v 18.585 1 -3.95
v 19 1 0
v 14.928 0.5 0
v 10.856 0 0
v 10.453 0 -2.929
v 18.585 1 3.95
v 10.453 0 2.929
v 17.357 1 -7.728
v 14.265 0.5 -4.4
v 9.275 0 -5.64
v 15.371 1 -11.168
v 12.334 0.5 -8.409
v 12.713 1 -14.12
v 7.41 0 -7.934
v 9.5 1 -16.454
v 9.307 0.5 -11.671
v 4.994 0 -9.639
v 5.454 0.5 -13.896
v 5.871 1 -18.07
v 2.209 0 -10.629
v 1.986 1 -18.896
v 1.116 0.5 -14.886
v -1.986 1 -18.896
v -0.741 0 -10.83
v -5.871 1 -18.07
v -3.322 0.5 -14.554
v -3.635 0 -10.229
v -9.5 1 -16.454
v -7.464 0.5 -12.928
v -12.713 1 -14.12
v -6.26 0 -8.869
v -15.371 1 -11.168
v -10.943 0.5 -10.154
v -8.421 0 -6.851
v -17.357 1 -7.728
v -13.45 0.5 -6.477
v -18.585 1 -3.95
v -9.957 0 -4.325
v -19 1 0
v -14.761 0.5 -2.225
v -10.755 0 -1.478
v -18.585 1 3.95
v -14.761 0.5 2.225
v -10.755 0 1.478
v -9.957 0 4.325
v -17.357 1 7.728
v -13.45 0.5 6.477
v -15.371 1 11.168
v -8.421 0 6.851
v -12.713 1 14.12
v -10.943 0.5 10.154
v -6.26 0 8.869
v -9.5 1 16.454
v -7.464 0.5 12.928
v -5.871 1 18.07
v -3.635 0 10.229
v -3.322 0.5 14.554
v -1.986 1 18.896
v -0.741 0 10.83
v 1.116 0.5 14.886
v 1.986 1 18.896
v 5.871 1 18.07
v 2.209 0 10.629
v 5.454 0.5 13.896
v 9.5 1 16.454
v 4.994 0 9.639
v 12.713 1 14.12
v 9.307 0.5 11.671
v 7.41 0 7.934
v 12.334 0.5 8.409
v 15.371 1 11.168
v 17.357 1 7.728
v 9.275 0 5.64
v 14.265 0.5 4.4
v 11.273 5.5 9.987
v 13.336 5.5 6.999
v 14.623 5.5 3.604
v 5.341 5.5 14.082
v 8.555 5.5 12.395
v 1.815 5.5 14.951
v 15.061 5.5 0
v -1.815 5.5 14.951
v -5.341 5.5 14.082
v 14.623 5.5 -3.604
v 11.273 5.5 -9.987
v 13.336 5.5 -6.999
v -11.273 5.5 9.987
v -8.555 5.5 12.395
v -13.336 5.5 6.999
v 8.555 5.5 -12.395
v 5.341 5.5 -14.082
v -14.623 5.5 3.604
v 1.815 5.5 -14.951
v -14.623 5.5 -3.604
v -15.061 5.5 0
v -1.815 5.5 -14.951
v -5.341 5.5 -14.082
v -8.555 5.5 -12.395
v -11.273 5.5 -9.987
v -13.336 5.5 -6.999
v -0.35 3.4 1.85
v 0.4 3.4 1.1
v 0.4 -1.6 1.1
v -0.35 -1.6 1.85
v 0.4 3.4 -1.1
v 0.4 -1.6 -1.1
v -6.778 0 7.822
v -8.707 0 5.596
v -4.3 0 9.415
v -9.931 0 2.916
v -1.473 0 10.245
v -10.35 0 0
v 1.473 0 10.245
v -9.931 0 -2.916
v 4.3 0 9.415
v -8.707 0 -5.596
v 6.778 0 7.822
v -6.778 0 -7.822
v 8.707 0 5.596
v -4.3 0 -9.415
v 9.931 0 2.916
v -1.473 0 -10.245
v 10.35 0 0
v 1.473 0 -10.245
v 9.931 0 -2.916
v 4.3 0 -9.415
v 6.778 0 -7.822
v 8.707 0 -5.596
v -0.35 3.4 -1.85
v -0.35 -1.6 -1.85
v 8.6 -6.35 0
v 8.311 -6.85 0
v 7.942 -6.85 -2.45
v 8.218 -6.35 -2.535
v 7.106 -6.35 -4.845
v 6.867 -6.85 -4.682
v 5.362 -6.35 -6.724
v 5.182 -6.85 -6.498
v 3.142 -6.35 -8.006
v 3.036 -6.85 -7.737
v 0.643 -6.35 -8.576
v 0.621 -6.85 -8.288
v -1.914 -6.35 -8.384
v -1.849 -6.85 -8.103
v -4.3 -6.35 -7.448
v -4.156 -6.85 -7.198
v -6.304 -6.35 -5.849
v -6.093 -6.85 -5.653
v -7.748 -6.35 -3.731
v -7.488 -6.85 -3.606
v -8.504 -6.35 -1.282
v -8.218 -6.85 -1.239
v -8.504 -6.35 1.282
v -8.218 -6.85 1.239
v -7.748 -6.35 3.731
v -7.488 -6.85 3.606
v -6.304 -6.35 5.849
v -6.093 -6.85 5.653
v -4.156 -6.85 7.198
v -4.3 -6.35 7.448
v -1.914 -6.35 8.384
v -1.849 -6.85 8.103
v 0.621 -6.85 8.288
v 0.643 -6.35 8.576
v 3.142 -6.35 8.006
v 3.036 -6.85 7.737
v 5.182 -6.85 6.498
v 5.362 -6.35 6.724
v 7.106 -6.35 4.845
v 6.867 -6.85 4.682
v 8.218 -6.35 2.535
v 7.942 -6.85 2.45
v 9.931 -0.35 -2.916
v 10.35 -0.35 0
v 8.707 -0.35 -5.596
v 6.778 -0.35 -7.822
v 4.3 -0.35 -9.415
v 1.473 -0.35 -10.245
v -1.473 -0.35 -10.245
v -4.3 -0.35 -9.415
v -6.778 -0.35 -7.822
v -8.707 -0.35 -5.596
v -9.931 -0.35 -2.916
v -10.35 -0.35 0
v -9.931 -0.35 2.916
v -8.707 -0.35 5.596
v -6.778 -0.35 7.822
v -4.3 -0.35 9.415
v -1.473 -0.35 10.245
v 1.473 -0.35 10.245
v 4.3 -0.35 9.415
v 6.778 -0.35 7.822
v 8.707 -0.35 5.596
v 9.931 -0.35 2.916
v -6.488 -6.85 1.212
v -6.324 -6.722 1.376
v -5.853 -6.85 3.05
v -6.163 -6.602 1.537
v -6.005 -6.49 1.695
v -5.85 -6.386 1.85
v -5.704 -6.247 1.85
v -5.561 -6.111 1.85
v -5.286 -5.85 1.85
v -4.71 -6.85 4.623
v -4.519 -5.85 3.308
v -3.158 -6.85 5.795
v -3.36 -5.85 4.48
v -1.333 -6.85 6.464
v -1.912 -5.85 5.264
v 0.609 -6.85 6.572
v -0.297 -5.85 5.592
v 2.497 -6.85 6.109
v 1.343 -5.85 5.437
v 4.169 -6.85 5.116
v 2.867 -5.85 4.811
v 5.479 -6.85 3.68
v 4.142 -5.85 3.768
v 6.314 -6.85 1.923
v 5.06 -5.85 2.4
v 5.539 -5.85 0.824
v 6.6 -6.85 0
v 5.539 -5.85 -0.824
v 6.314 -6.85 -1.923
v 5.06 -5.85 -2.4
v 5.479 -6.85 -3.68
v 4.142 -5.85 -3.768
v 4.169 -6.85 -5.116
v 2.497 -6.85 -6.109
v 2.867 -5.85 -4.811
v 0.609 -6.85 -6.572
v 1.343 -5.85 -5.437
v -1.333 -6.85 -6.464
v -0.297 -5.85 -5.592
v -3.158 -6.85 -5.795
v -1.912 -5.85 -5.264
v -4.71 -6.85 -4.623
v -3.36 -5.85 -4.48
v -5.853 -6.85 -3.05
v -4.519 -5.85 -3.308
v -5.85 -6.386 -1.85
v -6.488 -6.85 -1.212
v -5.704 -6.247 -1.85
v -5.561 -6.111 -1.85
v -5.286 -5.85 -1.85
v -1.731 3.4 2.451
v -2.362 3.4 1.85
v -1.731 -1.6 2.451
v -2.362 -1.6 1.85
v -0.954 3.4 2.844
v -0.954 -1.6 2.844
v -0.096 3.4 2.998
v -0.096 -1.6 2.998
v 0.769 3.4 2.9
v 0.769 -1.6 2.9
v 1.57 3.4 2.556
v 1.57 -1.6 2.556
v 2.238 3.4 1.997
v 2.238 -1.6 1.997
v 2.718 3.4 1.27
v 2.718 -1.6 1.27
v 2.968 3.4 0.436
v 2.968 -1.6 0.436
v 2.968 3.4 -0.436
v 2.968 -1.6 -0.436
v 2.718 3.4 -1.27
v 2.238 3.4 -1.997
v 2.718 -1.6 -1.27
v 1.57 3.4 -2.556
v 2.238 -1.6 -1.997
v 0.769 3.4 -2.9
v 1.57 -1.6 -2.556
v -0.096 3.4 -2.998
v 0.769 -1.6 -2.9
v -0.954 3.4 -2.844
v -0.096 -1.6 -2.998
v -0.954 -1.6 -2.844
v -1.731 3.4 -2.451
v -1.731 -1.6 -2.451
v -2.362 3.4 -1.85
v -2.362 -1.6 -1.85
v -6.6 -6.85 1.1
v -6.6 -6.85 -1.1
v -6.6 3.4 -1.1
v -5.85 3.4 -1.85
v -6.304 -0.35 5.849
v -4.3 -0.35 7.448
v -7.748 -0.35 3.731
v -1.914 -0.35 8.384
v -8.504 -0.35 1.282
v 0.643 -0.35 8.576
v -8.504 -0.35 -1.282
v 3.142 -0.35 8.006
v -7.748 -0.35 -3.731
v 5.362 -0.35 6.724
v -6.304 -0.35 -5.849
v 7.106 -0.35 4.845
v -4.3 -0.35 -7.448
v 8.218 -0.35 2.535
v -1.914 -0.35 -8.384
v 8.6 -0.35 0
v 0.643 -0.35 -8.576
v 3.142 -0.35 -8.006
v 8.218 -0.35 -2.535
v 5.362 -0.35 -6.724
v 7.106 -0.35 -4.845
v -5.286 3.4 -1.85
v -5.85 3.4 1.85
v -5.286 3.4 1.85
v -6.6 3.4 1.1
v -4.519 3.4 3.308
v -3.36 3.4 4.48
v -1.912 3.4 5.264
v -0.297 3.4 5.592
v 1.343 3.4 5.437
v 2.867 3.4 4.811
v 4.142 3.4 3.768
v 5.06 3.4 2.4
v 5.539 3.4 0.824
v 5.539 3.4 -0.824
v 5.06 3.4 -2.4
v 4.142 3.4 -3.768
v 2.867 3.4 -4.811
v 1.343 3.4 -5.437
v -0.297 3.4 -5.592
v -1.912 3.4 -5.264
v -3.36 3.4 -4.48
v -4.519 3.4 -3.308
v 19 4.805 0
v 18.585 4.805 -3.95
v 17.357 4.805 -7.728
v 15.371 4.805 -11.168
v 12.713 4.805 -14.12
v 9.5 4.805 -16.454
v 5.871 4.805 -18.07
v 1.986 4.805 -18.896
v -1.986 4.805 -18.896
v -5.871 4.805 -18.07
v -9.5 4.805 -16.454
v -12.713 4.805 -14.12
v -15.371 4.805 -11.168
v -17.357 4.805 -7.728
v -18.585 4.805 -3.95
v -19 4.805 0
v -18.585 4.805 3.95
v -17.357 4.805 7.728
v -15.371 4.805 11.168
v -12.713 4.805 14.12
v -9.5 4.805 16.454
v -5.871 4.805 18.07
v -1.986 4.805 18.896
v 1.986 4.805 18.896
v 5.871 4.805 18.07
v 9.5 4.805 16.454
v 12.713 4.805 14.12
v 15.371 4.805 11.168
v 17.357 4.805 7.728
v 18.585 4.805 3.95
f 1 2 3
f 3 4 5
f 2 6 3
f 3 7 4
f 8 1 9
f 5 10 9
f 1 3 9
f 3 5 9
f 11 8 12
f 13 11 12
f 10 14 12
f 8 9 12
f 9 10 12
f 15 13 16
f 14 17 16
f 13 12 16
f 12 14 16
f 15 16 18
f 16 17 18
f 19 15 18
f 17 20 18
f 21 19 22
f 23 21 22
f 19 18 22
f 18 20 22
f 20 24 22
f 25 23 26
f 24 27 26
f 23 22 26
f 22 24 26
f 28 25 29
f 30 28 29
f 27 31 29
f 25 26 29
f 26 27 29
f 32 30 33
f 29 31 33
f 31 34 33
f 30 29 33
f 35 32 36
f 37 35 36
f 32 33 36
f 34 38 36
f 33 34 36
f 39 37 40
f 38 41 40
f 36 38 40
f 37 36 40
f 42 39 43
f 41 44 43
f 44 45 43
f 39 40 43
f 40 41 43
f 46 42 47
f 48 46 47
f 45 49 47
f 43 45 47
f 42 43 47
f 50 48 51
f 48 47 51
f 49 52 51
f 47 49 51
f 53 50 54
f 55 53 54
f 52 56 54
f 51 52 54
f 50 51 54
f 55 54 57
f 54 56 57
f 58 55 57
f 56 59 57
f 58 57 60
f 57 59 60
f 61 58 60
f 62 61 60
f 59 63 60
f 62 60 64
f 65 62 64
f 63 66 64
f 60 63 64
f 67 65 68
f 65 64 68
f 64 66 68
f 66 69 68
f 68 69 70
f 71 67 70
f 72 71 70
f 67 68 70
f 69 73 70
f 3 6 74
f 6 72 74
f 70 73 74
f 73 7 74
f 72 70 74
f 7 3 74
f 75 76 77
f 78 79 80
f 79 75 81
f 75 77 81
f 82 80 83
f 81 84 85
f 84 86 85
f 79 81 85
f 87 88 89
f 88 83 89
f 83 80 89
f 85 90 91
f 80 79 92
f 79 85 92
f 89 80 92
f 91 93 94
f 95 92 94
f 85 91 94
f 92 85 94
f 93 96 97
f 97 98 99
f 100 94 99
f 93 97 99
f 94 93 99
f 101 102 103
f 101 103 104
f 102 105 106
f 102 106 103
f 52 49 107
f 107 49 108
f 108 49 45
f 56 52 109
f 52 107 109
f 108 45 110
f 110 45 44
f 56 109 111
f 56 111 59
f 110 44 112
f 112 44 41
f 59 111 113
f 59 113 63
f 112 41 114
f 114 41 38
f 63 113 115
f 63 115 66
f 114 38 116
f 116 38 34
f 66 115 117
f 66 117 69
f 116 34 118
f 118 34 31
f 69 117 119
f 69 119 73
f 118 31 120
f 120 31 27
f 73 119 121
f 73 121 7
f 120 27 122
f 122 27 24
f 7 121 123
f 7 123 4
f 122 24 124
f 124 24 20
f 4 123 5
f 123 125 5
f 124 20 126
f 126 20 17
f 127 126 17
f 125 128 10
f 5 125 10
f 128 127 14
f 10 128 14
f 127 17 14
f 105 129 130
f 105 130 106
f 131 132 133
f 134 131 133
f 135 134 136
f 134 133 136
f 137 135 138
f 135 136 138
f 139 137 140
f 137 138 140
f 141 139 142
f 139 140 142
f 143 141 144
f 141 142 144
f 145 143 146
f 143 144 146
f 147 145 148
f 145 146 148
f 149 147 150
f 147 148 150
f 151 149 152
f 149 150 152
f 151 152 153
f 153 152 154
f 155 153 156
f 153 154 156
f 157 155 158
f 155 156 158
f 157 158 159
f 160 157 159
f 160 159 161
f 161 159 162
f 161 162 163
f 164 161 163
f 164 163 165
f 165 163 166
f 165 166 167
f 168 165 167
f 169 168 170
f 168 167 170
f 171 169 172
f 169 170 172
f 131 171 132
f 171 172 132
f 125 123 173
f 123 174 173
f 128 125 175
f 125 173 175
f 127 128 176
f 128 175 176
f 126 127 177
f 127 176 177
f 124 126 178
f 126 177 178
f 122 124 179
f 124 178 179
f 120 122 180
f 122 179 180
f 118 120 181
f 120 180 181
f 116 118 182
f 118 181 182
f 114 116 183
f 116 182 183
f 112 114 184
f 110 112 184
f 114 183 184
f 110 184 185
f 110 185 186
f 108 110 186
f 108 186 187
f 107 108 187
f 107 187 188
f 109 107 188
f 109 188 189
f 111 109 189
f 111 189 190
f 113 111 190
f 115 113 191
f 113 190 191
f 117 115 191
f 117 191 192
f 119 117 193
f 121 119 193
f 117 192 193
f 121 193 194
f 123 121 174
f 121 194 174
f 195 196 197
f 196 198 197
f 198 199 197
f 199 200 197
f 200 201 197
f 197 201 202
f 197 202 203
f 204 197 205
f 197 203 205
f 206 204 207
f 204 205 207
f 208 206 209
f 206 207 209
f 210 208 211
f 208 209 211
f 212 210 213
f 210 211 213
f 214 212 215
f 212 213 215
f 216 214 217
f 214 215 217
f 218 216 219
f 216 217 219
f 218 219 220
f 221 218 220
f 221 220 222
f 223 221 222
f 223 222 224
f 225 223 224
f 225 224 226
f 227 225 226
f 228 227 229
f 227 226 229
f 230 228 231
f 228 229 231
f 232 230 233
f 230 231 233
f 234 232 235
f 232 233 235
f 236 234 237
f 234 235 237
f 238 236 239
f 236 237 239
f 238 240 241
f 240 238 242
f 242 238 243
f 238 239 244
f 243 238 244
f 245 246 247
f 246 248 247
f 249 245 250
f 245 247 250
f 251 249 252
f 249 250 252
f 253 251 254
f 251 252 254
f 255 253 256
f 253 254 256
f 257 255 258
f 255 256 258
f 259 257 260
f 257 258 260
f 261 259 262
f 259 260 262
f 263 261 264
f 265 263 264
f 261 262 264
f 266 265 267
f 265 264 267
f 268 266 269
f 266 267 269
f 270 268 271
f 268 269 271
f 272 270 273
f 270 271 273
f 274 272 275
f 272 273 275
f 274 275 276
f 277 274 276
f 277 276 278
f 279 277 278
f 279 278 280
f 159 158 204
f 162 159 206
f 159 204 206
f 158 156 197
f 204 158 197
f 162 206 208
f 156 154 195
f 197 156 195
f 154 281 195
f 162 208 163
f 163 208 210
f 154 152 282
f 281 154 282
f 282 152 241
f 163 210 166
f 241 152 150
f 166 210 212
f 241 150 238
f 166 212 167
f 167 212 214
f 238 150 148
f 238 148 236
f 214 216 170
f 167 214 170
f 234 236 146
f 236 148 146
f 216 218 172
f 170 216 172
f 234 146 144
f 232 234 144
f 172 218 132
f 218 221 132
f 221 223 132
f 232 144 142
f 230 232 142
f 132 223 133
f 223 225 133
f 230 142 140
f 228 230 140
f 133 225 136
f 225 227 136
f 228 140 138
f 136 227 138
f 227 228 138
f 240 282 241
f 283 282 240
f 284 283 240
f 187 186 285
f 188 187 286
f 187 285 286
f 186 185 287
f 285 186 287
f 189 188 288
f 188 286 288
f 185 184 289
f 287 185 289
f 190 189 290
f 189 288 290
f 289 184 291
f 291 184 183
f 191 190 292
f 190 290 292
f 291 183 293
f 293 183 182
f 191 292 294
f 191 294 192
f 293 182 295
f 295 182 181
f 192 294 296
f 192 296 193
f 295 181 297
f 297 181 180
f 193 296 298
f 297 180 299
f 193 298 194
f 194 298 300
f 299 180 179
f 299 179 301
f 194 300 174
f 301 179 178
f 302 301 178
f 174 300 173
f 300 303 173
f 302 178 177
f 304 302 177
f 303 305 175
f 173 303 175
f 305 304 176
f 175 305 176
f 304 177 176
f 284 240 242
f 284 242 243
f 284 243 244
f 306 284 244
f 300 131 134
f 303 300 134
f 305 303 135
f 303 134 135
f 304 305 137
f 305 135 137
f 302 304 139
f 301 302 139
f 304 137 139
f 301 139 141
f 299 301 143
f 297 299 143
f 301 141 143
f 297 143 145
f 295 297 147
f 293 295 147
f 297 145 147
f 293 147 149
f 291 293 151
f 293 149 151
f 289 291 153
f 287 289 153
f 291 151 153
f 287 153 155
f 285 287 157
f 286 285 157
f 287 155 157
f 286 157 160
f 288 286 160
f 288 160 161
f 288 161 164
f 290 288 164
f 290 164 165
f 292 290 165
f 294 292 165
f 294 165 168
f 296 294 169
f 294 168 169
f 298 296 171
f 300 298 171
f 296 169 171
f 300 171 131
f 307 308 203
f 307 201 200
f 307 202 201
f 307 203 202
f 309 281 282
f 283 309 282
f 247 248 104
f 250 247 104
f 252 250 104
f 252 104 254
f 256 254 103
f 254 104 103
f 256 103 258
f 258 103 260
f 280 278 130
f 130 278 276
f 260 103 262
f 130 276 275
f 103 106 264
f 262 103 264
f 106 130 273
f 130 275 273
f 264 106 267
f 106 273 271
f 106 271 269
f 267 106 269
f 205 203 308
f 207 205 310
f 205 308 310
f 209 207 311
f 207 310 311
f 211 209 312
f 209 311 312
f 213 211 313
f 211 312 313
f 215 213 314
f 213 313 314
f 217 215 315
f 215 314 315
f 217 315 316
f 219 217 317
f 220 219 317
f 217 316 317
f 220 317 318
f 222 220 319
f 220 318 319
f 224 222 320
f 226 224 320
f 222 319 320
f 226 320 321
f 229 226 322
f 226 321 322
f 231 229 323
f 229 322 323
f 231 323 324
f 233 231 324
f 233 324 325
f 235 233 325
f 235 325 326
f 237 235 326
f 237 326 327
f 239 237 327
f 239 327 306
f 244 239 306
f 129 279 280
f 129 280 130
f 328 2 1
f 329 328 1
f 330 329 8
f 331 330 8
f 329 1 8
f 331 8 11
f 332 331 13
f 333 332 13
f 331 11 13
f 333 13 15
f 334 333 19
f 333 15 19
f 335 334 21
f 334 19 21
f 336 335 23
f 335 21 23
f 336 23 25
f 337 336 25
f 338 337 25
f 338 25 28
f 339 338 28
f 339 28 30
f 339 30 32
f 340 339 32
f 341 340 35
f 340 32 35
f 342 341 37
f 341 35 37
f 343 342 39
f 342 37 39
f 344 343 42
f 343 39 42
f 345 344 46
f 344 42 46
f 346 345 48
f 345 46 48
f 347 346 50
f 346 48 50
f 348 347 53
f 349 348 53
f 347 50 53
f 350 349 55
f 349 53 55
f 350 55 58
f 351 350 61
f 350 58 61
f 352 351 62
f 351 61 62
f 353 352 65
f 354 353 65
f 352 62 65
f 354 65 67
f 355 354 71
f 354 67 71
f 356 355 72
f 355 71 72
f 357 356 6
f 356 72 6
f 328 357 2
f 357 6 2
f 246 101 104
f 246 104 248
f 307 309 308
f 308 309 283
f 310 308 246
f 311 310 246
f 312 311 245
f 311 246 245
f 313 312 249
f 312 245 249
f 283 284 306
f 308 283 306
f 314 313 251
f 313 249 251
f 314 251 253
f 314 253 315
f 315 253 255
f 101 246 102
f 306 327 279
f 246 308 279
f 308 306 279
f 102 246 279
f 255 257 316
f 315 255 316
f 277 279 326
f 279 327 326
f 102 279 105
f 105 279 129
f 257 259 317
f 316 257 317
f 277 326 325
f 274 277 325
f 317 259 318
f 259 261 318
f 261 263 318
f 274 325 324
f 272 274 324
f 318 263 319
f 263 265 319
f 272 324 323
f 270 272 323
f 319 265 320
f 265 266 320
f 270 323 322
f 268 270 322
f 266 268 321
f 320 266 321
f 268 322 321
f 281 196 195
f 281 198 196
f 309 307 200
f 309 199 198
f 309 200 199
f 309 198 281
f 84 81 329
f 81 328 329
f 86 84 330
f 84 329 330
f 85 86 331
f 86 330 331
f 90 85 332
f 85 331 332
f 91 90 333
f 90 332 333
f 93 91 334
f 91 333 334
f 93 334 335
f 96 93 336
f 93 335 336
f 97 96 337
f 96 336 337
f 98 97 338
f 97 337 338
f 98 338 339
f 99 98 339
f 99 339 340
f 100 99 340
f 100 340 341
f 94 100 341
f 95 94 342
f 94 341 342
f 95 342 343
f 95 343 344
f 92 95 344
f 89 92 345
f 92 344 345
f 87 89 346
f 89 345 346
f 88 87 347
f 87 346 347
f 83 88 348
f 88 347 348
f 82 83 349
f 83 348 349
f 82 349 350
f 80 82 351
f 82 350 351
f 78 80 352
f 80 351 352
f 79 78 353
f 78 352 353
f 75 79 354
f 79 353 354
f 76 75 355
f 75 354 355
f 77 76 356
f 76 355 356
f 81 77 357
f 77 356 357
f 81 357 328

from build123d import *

# Parameters (mm, degrees)
CHAMFER2_SIZE           = 1
CHAMFER2_SIZE2          = 8.144346428
CUT_EXTRUDE1_DEPTH      = 28.792265111
CUT_EXTRUDE1_DEPTH_BACK = 5
CHAMFER1_SIZE           = 1
CHAMFER3_SIZE           = 0.5
CHAMFER3_SIZE2          = 0.288675135


with BuildPart() as part:
    # Sketch1 → Revolve1 (revolve)
    with BuildSketch(Plane.XY, mode=Mode.PRIVATE) as revolve1_sk:
        Polygon((-15.060768988, 5.5), (-19, 4.805407289), (-19, 0), (-10.35, 0), (-10.35, -0.35), (-8.6, -0.35), (-8.6, -6.85), (-5.6, -6.85), (-5.6, 3.4), (-3, 3.4), (-3, -1.6), (0, -1.6), (0, 5.5), align=None)
    revolve(revolve1_sk.sketch.rotate(Axis((0, -1.6, 0), (0, 1, 0)), 180), axis=Axis((0, -1.6, 0), (0, 1, 0)))

    # Chamfer2
    chamfer2_edges = [part.edges().sort_by_distance(p)[0] for p in [
        (-19, 0, 0),
    ]]
    chamfer2_side = [part.faces().sort_by_distance(p)[0] for p in [
        (-19, 2.402703645, 0),
    ]]
    chamfer(chamfer2_edges, length=CHAMFER2_SIZE, length2=CHAMFER2_SIZE2, reference=chamfer2_side[0])

    # Sketch2 → Cut-Extrude1 (cut, two sides: drawn at the far end of the back side and taken through both)
    with BuildSketch(Plane.XZ.offset(1.6).offset(-CUT_EXTRUDE1_DEPTH_BACK)):
        Polygon((-5.85, 1.85), (-6.6, 1.1), (-6.6, -1.1), (-5.85, -1.85), (-0.35, -1.85), (0.4, -1.1), (0.4, 1.1), (-0.35, 1.85), align=None)
    extrude(amount=CUT_EXTRUDE1_DEPTH + CUT_EXTRUDE1_DEPTH_BACK, mode=Mode.SUBTRACT)

    # Chamfer1
    chamfer1_edges = [part.edges().sort_by_distance(p)[0] for p in [
        (5.6, -6.85, 0),
    ]]
    chamfer(chamfer1_edges, length=CHAMFER1_SIZE)

    # Chamfer3
    chamfer3_edges = [part.edges().sort_by_distance(p)[0] for p in [
        (-8.6, -6.85, 0),
    ]]
    chamfer3_side = [part.faces().sort_by_distance(p)[0] for p in [
        (-8.6, -3.6, 0),
    ]]
    chamfer(chamfer3_edges, length=CHAMFER3_SIZE, length2=CHAMFER3_SIZE2, reference=chamfer3_side[0])


solid = part.part
